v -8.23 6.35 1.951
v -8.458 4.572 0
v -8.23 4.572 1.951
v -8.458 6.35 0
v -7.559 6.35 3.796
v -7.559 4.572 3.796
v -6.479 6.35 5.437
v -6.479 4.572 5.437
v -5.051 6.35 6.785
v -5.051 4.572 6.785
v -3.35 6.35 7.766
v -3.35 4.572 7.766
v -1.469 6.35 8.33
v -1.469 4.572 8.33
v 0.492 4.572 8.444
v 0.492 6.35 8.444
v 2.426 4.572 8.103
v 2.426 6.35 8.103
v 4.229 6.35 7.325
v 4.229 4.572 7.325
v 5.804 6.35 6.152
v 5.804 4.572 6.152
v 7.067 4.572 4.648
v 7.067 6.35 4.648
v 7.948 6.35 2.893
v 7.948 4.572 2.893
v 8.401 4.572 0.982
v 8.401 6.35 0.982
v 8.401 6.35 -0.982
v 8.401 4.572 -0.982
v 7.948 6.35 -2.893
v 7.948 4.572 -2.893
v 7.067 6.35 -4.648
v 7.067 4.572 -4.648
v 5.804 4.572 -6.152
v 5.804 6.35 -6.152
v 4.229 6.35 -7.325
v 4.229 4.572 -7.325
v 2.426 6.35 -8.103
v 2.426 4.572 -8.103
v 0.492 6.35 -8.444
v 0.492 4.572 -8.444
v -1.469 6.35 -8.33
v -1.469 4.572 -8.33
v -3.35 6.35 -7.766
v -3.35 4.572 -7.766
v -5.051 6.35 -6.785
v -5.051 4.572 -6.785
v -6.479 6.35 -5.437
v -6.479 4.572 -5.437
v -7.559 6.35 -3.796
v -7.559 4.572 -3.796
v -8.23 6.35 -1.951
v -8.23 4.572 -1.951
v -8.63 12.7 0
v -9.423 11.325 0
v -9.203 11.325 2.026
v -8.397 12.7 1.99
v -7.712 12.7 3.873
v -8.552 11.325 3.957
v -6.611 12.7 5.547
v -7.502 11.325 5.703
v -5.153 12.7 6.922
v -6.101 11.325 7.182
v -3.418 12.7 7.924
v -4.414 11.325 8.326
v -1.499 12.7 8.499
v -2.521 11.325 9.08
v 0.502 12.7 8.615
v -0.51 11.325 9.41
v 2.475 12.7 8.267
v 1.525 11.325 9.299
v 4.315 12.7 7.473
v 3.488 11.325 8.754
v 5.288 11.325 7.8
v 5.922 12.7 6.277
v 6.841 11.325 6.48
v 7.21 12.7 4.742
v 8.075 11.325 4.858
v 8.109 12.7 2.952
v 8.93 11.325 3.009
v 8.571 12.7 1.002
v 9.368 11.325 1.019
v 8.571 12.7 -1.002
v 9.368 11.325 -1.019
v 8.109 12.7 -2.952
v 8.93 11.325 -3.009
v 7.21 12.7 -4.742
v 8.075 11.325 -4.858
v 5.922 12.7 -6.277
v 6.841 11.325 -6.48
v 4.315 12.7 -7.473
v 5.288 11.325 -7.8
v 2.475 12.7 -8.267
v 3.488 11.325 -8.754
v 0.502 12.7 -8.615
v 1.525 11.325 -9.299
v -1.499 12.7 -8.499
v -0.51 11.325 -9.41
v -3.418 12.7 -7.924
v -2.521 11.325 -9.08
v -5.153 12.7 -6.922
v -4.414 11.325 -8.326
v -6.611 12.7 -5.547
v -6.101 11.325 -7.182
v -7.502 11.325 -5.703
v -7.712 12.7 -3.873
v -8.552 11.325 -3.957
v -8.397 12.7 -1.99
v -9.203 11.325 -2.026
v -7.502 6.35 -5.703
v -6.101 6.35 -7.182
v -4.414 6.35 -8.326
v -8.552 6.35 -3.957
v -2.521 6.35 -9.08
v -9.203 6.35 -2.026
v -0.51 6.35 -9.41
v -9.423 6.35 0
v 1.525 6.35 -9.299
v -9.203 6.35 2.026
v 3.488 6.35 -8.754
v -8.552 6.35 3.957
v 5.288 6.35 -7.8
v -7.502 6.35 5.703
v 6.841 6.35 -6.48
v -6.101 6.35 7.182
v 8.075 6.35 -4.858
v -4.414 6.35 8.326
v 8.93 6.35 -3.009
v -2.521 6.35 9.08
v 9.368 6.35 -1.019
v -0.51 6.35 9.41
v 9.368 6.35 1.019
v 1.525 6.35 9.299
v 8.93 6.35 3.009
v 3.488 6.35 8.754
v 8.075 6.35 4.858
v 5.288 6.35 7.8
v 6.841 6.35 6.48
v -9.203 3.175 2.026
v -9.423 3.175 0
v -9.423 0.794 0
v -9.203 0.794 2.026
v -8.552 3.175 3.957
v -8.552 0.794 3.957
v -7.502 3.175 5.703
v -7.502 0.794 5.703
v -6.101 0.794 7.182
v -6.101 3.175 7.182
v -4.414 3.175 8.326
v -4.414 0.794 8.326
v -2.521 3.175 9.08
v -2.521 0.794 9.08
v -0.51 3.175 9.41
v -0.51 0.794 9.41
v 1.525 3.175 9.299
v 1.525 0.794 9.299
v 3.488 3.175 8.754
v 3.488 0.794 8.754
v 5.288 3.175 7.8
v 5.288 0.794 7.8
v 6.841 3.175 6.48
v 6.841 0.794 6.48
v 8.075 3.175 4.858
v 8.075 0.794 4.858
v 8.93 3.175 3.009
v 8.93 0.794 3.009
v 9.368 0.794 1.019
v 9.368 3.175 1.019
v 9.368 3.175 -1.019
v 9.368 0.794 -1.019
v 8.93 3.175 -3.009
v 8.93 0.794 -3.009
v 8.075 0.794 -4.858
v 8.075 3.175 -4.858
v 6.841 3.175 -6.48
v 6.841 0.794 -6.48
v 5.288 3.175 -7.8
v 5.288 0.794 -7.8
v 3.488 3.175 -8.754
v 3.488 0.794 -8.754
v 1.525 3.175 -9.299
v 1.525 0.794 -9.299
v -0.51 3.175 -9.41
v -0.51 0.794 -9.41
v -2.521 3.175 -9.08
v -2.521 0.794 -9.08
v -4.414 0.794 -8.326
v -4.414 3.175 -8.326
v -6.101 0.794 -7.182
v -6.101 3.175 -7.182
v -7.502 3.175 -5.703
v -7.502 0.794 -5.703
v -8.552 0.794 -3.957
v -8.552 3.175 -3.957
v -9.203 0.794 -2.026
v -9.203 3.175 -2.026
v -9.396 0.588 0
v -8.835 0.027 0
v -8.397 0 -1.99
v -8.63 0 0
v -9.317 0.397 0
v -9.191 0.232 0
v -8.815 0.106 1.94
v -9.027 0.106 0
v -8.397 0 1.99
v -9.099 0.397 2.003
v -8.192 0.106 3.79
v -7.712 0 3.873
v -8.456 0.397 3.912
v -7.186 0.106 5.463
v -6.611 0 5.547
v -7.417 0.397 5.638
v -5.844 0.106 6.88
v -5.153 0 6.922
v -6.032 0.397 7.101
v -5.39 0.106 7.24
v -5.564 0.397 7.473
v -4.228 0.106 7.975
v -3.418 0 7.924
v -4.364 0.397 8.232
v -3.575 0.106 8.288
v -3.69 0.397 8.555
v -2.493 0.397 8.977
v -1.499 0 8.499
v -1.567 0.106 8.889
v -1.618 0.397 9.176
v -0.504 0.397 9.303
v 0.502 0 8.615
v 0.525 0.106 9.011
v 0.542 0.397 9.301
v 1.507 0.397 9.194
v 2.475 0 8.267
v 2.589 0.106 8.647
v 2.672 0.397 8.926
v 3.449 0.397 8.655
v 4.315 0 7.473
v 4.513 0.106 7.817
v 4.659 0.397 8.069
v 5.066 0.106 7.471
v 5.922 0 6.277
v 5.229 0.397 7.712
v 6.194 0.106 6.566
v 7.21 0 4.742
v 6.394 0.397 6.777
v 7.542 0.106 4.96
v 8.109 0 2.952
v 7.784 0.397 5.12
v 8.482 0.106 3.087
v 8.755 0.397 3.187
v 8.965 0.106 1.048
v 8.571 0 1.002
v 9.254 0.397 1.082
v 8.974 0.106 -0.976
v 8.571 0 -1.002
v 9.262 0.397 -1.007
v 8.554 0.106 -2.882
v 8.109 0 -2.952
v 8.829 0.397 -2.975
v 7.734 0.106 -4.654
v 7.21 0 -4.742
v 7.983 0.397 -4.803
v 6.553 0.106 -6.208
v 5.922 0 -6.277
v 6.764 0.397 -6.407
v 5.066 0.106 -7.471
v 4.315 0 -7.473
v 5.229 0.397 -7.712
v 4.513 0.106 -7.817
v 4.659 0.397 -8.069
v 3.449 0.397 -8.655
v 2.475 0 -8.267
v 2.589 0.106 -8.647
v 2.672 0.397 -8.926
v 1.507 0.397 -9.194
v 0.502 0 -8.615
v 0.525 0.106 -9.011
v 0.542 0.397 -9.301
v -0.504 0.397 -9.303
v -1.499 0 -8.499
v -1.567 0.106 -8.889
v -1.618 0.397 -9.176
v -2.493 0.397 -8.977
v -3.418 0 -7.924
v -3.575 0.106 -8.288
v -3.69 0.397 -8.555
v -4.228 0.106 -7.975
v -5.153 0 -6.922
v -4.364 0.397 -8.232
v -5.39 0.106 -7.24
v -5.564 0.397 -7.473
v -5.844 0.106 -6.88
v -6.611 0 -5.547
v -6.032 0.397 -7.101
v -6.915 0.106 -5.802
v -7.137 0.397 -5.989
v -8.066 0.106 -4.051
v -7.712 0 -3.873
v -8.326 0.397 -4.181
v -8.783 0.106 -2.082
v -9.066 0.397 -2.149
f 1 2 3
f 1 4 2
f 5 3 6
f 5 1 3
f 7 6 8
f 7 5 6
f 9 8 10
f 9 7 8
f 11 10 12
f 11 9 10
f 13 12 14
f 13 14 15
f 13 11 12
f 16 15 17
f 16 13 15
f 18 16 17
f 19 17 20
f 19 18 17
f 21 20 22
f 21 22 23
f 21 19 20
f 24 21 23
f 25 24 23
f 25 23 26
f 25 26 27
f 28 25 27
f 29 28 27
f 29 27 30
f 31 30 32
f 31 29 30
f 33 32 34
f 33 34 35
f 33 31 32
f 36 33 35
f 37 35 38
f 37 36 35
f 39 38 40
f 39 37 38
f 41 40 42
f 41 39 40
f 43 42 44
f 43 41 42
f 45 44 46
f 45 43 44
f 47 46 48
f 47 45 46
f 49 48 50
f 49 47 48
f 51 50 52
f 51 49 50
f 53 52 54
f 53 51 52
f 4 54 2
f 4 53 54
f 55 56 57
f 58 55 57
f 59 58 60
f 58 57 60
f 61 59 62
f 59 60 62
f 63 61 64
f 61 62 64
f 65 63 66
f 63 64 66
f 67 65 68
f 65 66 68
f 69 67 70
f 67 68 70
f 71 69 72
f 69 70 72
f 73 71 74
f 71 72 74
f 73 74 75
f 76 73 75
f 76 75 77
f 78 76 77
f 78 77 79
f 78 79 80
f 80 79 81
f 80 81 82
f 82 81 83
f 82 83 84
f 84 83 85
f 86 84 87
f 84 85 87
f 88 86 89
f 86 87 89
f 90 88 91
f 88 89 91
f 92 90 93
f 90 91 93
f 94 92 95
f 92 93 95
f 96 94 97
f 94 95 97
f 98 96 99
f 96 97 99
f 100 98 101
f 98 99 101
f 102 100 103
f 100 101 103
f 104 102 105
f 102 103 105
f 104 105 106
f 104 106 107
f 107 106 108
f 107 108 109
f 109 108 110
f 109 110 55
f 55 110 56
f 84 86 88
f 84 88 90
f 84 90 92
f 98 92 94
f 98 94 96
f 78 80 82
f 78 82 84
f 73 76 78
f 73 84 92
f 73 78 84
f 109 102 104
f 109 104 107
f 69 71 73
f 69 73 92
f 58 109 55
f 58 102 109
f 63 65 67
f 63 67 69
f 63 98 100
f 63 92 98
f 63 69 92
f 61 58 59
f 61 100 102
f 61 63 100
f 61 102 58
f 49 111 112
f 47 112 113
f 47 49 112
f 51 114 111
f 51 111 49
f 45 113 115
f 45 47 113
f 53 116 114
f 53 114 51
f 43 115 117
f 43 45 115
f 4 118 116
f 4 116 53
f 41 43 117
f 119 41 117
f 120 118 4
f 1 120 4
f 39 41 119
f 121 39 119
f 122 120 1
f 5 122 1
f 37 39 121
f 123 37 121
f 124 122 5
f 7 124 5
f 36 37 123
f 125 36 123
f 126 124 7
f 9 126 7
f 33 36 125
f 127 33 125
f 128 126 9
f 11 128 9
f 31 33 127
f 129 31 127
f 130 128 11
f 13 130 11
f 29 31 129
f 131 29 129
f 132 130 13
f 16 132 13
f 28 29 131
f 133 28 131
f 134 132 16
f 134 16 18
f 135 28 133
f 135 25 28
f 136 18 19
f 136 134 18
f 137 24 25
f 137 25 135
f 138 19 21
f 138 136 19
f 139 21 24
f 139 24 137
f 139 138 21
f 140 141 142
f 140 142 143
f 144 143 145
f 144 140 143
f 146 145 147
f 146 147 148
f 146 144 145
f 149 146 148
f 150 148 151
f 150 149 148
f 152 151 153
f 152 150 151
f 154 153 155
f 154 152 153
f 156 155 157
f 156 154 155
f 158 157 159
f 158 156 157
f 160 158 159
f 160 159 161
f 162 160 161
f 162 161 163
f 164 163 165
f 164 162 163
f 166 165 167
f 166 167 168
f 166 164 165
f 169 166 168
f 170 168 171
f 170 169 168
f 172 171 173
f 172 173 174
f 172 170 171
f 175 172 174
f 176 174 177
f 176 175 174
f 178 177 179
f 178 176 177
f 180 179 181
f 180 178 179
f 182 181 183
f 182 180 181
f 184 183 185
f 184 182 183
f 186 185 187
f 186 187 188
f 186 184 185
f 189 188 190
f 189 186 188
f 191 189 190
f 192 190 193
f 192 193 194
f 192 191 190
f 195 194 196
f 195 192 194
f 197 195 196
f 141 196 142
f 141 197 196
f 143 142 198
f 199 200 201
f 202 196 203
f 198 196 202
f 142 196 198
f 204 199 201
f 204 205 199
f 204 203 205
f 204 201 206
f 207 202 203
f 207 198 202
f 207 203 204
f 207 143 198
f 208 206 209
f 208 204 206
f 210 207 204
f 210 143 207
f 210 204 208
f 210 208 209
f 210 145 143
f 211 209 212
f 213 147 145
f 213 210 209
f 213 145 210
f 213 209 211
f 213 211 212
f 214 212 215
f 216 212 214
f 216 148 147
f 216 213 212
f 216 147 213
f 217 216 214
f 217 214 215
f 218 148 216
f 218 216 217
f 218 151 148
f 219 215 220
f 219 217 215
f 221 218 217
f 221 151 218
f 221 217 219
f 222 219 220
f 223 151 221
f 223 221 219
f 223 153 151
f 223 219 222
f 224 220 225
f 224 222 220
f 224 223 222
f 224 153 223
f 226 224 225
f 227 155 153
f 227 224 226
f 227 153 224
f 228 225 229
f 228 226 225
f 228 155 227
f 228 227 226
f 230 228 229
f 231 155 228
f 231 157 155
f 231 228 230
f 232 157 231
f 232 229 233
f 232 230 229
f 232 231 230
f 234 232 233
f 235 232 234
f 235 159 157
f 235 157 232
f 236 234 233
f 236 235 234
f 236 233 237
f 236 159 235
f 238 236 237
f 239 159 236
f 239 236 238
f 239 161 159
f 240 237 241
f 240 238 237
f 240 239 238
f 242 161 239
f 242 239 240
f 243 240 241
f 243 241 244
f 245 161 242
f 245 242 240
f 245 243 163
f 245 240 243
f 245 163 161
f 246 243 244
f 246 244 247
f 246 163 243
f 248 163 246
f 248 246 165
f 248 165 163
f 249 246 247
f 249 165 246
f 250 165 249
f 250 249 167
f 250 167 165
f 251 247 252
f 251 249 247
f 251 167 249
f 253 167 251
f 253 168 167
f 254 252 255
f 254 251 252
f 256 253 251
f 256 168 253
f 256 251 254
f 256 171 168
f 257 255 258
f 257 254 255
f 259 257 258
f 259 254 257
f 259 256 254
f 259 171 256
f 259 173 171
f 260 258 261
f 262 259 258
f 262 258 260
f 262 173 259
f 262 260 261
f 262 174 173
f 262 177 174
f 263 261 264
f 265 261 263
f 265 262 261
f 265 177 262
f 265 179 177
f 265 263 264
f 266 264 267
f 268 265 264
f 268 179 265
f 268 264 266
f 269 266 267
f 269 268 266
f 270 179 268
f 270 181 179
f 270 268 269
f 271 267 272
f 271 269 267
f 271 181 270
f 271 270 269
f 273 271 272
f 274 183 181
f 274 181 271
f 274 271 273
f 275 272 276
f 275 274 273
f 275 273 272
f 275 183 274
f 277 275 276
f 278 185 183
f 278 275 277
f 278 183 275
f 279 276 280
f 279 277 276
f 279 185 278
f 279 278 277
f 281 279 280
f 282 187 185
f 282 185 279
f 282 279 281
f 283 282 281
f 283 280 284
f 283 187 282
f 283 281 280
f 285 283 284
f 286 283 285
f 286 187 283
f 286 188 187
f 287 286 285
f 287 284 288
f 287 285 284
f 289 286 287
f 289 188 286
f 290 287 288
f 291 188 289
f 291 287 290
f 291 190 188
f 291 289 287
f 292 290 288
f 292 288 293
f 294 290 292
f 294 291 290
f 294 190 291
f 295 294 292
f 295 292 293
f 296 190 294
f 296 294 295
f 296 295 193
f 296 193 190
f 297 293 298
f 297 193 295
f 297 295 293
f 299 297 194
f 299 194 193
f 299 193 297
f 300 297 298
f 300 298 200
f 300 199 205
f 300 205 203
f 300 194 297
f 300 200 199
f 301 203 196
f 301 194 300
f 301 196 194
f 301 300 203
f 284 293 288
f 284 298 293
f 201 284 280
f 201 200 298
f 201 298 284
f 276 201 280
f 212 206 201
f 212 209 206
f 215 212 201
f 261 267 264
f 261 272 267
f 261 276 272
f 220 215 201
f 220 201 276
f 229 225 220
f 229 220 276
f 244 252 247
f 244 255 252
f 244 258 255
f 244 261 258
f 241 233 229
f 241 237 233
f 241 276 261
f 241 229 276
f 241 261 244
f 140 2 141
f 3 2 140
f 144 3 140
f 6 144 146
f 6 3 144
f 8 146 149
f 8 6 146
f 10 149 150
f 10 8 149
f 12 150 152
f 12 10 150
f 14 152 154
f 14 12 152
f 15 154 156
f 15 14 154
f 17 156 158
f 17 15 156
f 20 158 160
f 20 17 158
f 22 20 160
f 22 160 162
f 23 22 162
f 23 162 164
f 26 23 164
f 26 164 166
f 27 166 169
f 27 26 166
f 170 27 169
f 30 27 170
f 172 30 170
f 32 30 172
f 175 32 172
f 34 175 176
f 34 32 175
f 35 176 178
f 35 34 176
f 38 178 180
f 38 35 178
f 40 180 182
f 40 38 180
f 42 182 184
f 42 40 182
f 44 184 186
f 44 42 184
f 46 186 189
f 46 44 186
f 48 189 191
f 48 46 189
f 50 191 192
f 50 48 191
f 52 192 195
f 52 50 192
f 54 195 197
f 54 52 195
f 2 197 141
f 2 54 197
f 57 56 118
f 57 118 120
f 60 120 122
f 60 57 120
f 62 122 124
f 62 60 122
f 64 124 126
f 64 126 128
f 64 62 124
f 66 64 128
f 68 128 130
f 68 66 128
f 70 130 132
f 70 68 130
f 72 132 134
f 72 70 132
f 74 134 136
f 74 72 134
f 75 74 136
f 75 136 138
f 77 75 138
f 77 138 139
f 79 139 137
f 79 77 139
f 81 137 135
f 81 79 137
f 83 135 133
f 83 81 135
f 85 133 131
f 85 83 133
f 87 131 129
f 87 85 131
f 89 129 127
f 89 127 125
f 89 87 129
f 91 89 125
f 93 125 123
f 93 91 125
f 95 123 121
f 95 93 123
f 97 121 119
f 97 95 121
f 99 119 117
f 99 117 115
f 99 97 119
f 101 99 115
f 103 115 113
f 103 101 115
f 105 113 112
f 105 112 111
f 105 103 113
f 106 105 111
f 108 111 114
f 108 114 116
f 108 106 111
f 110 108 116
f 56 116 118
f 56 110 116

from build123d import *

# Parameters (mm, degrees)
FILLET1_R      = 0.79375
CHAMFER1_SIZE  = 0.79375
CHAMFER1_SIZE2 = 1.374815329


with BuildPart() as part:
    # Sketch1 → Revolve1 (revolve)
    with BuildSketch(Plane.XY):
        Polygon((0, 0), (-9.4234, 0), (-9.4234, 3.175), (-8.4582, 4.572), (-8.4582, 6.35), (-9.4234, 6.35), (-9.4234, 12.7), (0, 12.7), align=None)
    revolve(axis=Axis((0, 0, 0), (0, 1, 0)))

    # Fillet1
    fillet1_edges = [part.edges().sort_by_distance(p)[0] for p in [
        (9.4234, 0, 0),
    ]]
    fillet(fillet1_edges, radius=FILLET1_R)

    # Chamfer1
    chamfer1_edges = [part.edges().sort_by_distance(p)[0] for p in [
        (9.4234, 12.7, 0),
    ]]
    chamfer1_side = [part.faces().sort_by_distance(p)[0] for p in [
        (0, 12.7, 0),
    ]]
    chamfer(chamfer1_edges, length=CHAMFER1_SIZE, length2=CHAMFER1_SIZE2, reference=chamfer1_side[0])


solid = part.part
